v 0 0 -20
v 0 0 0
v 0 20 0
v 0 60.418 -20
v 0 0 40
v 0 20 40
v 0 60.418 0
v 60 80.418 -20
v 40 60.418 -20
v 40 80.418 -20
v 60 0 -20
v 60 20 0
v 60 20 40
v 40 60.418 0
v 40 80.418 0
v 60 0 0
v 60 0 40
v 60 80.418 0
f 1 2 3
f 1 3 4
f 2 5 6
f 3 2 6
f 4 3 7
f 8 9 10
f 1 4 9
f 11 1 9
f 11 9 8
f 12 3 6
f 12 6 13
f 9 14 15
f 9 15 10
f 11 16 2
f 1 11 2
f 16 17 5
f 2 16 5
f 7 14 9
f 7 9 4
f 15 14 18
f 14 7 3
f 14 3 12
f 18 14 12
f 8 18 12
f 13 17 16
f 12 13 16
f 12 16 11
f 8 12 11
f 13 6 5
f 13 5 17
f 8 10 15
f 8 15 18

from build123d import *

# Parameters (mm, degrees)
ESBO_O1_W                = 60
ESBO_O1_H                = 20
RESSALTO_EXTRUS_O1_DEPTH = 40
ESBO_O2_W                = 60
ESBO_O2_H                = 60.417785093
RESSALTO_EXTRUS_O2_DEPTH = 20
ESBO_O3_W                = 20
ESBO_O3_H                = 20
RESSALTO_EXTRUS_O3_DEPTH = 20


with BuildPart() as part:
    # Esboço1 → Ressalto-extrusão1 (new body)
    with BuildSketch(Plane.XY):
        with Locations((30, 10)):
            Rectangle(ESBO_O1_W, ESBO_O1_H)
    extrude(amount=RESSALTO_EXTRUS_O1_DEPTH)

    # Esboço2 → Ressalto-extrusão2 (add)
    with BuildSketch(Plane(origin=(0, 0, 0), x_dir=(-1, 0, 0), z_dir=(0, 0, -1))):
        with Locations((-30, 30.208892547)):
            Rectangle(ESBO_O2_W, ESBO_O2_H)
    extrude(amount=RESSALTO_EXTRUS_O2_DEPTH)

    # Esboço3 → Ressalto-extrusão3 (add)
    with BuildSketch(Plane(origin=(0, 60.417785093, 0), x_dir=(1, 0, 0), z_dir=(0, 1, 0))):
        with Locations((50, 10)):
            Rectangle(ESBO_O3_W, ESBO_O3_H)
    extrude(amount=RESSALTO_EXTRUS_O3_DEPTH)


solid = part.part
